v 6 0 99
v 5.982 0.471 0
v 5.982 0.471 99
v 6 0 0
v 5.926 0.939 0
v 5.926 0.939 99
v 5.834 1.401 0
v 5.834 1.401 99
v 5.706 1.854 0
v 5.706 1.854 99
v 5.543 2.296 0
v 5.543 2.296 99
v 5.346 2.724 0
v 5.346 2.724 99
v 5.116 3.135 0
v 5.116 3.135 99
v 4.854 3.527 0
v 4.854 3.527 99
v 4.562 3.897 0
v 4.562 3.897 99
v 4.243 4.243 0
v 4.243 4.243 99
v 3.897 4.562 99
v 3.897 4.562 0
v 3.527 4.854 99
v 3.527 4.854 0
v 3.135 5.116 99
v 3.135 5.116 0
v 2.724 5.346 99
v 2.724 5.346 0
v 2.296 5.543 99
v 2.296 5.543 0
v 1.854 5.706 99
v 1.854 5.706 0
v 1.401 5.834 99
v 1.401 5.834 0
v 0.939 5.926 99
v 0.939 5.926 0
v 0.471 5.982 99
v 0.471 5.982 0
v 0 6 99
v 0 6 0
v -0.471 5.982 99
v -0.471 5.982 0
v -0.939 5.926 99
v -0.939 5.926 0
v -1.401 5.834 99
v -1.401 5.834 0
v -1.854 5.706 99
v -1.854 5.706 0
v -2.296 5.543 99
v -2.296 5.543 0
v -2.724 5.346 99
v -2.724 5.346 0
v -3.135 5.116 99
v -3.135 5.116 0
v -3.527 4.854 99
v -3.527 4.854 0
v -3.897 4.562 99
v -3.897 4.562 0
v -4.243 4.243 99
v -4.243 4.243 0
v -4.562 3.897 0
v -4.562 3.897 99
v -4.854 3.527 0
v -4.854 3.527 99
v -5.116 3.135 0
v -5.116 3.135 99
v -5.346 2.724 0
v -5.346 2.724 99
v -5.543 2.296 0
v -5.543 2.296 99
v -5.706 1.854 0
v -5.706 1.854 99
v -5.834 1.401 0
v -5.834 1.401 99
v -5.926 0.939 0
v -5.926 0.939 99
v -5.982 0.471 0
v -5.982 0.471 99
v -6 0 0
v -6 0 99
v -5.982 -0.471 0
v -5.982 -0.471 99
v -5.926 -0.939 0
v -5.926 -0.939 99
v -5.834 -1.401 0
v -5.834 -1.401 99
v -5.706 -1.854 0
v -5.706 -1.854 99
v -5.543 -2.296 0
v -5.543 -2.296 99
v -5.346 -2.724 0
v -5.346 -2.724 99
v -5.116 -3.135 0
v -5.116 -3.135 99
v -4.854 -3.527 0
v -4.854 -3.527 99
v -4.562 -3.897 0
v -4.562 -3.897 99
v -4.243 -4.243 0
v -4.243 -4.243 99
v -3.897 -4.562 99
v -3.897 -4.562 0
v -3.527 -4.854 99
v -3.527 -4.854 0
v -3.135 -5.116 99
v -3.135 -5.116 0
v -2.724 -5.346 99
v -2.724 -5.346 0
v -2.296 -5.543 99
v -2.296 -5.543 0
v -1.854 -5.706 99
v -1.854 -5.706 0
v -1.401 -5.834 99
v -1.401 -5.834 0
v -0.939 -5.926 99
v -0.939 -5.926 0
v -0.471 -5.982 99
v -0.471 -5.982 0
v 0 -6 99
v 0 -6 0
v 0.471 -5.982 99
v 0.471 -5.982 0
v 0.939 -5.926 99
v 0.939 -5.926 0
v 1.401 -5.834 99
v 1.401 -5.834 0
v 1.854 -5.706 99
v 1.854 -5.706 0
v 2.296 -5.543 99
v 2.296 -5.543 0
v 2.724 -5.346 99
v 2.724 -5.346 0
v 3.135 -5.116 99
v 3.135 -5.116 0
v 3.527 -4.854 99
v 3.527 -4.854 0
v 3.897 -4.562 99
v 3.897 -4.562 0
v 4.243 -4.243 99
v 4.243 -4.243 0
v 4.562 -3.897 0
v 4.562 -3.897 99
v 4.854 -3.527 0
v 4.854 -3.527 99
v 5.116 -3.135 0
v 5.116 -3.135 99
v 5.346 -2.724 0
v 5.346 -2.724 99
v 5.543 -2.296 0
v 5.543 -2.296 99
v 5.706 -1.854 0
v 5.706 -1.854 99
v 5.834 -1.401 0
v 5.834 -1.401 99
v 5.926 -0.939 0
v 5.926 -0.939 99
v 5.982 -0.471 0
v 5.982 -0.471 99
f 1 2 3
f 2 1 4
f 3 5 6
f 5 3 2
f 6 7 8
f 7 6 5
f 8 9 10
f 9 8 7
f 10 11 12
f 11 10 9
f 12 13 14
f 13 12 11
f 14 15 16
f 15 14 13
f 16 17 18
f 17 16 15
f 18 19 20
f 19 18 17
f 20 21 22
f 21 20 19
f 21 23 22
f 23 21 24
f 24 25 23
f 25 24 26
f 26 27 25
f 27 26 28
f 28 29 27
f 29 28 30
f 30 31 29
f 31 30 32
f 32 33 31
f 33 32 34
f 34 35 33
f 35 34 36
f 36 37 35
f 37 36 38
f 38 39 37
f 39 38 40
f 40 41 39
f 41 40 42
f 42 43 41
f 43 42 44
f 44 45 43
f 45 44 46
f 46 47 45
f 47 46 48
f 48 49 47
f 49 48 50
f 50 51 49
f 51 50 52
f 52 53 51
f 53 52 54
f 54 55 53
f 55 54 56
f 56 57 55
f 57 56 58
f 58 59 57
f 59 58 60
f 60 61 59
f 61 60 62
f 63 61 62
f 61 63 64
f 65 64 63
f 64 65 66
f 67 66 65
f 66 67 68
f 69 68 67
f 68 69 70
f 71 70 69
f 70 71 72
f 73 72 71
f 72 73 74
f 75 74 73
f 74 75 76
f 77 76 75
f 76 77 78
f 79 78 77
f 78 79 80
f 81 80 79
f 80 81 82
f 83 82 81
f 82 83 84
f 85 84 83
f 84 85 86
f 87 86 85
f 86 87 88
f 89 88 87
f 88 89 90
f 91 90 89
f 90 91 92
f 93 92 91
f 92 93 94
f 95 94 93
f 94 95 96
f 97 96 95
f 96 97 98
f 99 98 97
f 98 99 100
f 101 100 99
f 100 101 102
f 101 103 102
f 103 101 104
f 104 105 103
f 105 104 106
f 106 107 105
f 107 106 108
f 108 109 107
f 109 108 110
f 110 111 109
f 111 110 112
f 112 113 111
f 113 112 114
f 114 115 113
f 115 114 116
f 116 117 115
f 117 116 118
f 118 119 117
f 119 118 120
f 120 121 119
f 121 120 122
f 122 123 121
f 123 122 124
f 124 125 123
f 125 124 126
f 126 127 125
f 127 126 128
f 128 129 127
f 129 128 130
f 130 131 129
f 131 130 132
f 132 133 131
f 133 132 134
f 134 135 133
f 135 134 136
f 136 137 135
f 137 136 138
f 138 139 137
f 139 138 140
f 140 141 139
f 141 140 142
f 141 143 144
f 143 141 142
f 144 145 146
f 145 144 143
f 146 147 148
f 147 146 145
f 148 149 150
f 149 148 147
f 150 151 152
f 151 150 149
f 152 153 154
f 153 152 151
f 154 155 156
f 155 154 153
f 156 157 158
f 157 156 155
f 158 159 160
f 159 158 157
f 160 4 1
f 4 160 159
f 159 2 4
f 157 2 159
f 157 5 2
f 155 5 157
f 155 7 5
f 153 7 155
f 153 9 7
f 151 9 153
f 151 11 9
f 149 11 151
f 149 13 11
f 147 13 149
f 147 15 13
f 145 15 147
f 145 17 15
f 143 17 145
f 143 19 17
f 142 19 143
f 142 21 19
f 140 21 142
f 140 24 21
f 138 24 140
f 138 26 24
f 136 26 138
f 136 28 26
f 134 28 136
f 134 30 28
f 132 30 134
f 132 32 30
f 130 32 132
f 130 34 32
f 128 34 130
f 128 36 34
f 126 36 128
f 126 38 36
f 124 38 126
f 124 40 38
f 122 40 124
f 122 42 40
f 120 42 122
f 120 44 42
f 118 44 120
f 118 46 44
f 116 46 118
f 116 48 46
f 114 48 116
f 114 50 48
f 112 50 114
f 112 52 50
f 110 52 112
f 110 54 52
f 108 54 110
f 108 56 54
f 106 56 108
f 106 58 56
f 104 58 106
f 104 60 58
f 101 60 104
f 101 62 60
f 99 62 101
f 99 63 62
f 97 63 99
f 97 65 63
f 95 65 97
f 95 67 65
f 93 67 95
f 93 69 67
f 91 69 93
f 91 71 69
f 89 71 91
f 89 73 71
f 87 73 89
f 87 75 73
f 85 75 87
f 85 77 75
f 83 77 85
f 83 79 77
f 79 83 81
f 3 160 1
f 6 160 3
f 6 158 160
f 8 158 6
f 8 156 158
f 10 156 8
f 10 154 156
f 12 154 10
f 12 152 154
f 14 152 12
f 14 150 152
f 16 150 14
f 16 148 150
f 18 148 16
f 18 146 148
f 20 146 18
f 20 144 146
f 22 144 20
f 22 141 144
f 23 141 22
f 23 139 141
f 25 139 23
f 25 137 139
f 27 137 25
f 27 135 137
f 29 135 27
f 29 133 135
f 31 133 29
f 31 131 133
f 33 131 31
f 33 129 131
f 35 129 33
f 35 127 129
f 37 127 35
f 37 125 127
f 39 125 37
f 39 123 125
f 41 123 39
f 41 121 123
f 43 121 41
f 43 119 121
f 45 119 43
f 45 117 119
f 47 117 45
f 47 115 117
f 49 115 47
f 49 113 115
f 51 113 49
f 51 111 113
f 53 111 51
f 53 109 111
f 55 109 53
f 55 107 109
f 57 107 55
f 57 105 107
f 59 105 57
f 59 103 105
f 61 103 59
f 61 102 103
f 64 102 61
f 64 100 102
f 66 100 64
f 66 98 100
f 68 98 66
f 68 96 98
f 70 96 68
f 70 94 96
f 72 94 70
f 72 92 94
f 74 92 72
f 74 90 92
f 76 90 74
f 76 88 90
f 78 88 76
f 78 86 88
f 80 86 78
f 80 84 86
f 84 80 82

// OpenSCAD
rodDiameter = 12; // Reel hole size 13-ish mm. SuppotHole = 12mm.

// How many reels this should support.
numberOfReels = 7;

// How wide the dispensing blocks are
blockWidth = 13;

// How deep the inset in the support is.
supportInset = 5;

rodHeight =  (blockWidth * numberOfReels) + (2 * (supportInset -1) );

echo ("rodHeight", rodHeight);

cylinder(d=rodDiameter, h=rodHeight, $fn=80);
